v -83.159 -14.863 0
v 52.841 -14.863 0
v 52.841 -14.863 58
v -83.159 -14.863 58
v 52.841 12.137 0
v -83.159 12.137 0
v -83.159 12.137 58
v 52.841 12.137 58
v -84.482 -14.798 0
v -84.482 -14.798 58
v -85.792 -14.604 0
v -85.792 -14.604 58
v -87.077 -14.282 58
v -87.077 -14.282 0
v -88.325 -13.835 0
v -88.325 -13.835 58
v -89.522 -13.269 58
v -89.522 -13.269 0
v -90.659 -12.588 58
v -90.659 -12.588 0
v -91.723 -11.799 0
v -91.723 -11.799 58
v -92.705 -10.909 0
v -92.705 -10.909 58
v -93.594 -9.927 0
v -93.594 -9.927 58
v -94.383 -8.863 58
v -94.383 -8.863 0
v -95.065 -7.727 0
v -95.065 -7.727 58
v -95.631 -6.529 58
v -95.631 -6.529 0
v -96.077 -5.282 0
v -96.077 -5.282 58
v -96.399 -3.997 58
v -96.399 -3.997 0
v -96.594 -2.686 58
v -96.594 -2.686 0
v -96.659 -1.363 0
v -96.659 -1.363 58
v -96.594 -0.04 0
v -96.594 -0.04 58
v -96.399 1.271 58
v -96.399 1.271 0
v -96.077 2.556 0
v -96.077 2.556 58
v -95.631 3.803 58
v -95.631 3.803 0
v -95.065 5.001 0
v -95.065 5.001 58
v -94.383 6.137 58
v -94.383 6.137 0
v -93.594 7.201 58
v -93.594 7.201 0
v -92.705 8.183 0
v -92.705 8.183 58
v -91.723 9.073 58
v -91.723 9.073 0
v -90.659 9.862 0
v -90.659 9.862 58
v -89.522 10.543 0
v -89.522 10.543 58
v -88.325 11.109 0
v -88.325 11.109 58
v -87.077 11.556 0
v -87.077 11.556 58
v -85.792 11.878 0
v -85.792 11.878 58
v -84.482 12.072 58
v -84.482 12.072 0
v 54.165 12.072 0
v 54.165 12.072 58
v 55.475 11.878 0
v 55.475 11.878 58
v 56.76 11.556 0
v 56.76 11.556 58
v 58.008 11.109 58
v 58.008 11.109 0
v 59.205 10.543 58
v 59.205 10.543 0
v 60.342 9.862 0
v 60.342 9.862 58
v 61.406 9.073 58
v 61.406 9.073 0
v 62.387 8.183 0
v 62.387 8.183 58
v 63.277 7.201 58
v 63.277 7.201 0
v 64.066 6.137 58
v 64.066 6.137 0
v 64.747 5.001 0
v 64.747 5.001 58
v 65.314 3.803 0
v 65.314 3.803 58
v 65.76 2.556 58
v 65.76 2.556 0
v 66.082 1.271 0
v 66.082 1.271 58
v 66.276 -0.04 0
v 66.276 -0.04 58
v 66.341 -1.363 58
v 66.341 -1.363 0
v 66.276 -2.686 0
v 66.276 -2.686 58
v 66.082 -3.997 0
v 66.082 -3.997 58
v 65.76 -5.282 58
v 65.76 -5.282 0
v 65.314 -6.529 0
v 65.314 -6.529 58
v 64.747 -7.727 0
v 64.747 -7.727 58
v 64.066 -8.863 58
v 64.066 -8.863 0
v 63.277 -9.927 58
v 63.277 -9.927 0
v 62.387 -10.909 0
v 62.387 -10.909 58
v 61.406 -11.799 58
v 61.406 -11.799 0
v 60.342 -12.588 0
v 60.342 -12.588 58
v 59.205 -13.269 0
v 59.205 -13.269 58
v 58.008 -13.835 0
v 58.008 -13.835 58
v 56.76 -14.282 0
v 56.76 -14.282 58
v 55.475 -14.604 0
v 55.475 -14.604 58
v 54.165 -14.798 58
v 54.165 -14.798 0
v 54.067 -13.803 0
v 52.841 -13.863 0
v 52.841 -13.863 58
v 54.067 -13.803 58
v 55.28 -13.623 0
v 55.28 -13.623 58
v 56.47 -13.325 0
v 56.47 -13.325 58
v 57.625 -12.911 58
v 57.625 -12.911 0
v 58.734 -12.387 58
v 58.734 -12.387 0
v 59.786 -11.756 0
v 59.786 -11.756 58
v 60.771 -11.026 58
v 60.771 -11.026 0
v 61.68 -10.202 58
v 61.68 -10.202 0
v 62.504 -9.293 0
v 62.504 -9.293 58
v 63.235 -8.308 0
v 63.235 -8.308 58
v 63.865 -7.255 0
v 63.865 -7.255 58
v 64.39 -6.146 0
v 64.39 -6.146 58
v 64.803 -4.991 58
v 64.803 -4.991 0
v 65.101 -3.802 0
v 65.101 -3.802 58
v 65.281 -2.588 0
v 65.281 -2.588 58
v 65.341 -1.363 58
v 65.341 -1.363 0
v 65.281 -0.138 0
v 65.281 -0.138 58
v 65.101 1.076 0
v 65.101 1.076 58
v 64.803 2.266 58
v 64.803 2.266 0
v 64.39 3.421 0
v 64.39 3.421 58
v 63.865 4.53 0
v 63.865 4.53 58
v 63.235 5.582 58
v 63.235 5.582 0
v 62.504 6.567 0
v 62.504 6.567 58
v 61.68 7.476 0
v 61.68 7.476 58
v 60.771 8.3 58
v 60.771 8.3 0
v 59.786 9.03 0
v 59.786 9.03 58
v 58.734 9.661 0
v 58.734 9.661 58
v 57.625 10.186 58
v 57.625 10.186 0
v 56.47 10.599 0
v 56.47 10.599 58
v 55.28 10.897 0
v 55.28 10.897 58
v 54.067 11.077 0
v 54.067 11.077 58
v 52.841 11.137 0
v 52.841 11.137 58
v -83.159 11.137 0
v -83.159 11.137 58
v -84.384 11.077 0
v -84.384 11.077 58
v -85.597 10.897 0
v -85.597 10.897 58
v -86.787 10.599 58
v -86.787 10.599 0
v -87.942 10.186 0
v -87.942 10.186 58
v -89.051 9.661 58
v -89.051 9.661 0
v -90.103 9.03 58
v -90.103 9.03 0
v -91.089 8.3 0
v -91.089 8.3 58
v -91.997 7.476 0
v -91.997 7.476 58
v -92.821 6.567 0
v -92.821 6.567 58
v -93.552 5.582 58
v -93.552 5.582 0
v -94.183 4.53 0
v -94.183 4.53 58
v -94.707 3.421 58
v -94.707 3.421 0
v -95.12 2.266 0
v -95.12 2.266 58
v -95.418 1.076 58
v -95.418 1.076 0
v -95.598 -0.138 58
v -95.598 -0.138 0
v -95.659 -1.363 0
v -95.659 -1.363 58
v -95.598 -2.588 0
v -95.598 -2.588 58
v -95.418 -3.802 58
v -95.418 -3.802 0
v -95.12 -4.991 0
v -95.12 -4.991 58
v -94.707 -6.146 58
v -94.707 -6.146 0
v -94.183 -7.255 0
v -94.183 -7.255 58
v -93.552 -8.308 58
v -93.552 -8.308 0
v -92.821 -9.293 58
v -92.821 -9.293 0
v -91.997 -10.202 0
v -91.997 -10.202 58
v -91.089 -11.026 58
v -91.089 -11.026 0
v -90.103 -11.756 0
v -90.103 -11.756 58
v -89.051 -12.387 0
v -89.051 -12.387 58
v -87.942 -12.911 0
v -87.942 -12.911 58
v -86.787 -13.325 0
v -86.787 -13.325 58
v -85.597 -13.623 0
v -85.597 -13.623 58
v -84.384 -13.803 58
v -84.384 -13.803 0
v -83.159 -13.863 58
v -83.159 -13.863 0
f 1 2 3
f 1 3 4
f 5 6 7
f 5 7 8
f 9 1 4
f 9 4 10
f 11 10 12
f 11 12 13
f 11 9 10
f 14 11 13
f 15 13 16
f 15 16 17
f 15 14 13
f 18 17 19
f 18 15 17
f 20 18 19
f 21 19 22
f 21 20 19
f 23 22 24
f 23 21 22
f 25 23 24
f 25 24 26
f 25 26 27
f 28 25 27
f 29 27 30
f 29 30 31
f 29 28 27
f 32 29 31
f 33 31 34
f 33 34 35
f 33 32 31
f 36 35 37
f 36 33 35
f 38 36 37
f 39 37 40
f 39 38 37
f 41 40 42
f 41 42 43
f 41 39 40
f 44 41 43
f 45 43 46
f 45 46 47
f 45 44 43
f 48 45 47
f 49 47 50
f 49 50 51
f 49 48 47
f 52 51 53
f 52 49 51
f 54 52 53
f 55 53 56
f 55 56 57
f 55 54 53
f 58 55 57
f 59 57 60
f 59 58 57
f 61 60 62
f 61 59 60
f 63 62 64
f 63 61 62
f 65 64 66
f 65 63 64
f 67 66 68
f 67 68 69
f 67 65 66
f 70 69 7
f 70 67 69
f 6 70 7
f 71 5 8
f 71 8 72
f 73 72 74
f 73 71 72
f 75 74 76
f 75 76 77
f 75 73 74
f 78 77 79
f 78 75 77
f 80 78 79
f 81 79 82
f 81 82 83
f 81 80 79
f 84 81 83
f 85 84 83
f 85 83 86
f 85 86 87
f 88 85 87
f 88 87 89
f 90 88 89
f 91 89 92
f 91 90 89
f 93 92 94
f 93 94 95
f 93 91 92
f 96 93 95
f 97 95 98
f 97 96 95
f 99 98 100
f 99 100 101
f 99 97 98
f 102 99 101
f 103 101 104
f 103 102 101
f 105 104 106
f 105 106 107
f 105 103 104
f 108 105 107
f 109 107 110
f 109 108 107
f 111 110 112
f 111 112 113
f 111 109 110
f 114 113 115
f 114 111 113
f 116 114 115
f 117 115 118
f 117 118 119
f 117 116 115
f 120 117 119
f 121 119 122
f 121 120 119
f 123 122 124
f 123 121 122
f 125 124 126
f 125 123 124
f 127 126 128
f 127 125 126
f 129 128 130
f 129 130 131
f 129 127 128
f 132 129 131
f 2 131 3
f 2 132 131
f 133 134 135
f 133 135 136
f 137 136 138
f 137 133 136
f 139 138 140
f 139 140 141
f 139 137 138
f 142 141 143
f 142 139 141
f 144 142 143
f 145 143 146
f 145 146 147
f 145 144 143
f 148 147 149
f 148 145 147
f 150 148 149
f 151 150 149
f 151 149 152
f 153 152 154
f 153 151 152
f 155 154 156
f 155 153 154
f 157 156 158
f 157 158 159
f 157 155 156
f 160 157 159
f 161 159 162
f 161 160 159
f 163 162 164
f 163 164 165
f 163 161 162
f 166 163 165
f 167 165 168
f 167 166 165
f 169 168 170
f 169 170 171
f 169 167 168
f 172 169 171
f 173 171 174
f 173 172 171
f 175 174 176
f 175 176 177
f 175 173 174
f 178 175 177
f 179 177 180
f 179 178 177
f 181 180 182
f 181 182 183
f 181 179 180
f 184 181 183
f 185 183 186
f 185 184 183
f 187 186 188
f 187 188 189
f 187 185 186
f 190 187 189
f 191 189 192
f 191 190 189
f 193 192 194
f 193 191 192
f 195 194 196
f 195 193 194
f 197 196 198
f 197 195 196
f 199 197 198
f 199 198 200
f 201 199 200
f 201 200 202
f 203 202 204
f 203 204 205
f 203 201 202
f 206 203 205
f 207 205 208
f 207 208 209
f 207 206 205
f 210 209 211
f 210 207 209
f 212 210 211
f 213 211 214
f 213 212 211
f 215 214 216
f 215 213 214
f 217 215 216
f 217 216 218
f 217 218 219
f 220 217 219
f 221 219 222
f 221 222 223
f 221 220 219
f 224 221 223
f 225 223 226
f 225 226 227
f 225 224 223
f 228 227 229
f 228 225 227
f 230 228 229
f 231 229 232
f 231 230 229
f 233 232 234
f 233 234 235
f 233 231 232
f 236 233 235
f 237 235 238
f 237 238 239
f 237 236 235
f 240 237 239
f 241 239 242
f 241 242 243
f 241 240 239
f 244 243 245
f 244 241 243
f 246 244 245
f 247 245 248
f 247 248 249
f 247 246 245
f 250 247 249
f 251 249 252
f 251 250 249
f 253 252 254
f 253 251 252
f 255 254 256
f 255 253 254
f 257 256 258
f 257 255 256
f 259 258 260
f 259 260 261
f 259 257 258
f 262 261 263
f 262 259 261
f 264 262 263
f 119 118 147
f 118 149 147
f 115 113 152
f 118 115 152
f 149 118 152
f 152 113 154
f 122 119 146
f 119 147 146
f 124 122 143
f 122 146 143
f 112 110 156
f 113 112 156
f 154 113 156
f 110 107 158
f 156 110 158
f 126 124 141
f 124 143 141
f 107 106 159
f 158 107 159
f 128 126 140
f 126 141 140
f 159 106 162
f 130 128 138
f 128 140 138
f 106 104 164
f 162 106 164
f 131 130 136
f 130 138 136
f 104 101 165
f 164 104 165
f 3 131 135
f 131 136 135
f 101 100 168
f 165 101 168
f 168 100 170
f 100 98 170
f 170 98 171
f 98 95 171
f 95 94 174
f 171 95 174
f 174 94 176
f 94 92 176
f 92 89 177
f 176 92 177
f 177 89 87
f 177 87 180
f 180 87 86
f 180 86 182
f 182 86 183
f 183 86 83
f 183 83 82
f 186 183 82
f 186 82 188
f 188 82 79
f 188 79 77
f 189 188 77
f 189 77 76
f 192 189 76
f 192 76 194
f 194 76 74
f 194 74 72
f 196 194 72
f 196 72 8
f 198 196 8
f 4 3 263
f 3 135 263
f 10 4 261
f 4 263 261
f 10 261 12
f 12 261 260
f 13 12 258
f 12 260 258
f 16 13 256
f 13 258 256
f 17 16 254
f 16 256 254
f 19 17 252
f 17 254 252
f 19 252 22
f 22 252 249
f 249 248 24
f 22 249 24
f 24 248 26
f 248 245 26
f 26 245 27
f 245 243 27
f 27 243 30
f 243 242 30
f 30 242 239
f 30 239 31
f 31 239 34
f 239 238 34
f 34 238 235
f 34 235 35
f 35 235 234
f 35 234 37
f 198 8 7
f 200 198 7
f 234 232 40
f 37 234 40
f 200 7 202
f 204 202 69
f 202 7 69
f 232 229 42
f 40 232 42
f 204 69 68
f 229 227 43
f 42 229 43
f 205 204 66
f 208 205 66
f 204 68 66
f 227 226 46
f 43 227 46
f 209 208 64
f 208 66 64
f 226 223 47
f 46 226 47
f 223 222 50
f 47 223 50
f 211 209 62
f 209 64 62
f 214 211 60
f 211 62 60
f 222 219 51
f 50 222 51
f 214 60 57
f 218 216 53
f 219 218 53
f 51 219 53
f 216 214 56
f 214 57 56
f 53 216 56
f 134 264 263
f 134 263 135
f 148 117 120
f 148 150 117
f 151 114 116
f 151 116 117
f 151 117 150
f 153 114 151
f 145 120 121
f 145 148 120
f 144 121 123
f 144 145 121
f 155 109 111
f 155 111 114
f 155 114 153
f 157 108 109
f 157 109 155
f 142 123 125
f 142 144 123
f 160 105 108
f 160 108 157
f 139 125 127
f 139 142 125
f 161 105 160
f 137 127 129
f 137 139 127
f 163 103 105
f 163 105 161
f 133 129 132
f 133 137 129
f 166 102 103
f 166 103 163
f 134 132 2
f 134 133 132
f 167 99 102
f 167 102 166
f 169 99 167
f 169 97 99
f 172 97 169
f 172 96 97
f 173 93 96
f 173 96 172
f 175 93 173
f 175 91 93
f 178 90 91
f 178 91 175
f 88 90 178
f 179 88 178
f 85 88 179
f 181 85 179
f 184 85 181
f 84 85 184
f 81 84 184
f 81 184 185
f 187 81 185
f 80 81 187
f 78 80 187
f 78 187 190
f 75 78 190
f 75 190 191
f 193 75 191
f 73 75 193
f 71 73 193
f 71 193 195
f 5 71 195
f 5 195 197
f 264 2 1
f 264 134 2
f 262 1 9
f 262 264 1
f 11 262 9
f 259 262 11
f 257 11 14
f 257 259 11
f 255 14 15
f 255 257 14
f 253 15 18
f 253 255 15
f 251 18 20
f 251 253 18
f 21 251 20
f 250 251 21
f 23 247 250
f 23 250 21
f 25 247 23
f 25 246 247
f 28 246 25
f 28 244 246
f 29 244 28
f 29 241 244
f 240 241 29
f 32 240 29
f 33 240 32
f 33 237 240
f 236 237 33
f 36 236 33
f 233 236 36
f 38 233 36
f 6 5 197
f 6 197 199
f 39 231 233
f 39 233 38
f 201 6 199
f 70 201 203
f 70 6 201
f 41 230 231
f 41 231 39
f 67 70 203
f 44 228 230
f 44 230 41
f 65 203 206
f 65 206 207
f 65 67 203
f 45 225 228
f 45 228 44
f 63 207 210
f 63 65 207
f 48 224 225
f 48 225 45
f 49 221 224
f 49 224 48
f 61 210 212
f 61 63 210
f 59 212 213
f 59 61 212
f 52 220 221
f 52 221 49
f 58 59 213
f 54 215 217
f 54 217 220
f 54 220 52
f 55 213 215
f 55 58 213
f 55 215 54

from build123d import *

# Parameters (mm, degrees)
BOSS_EXTRUDE1_DEPTH = 58


with BuildPart() as part:
    # Sketch1 → Boss-Extrude1 (new body)
    with BuildSketch(Plane.XY):
        with BuildLine():
            ThreePointArc((52.841370729, 12.137062925), (66.341370729, -1.362937075), (52.841370729, -14.862937075))
            Line((52.841370729, -14.862937075), (-83.158629271, -14.862937075))
            ThreePointArc((-83.158629271, -14.862937075), (-96.658629271, -1.362937075), (-83.158629271, 12.137062925))
            Line((-83.158629271, 12.137062925), (52.841370729, 12.137062925))
        make_face()
        with BuildLine():
            ThreePointArc((52.841370729, -13.862937075), (65.341370729, -1.362937075), (52.841370729, 11.137062925))
            Line((52.841370729, 11.137062925), (-83.158629271, 11.137062925))
            ThreePointArc((-83.158629271, 11.137062925), (-95.658629271, -1.362937075), (-83.158629271, -13.862937075))
            Line((-83.158629271, -13.862937075), (52.841370729, -13.862937075))
        make_face(mode=Mode.SUBTRACT)
    extrude(amount=BOSS_EXTRUDE1_DEPTH)


solid = part.part
